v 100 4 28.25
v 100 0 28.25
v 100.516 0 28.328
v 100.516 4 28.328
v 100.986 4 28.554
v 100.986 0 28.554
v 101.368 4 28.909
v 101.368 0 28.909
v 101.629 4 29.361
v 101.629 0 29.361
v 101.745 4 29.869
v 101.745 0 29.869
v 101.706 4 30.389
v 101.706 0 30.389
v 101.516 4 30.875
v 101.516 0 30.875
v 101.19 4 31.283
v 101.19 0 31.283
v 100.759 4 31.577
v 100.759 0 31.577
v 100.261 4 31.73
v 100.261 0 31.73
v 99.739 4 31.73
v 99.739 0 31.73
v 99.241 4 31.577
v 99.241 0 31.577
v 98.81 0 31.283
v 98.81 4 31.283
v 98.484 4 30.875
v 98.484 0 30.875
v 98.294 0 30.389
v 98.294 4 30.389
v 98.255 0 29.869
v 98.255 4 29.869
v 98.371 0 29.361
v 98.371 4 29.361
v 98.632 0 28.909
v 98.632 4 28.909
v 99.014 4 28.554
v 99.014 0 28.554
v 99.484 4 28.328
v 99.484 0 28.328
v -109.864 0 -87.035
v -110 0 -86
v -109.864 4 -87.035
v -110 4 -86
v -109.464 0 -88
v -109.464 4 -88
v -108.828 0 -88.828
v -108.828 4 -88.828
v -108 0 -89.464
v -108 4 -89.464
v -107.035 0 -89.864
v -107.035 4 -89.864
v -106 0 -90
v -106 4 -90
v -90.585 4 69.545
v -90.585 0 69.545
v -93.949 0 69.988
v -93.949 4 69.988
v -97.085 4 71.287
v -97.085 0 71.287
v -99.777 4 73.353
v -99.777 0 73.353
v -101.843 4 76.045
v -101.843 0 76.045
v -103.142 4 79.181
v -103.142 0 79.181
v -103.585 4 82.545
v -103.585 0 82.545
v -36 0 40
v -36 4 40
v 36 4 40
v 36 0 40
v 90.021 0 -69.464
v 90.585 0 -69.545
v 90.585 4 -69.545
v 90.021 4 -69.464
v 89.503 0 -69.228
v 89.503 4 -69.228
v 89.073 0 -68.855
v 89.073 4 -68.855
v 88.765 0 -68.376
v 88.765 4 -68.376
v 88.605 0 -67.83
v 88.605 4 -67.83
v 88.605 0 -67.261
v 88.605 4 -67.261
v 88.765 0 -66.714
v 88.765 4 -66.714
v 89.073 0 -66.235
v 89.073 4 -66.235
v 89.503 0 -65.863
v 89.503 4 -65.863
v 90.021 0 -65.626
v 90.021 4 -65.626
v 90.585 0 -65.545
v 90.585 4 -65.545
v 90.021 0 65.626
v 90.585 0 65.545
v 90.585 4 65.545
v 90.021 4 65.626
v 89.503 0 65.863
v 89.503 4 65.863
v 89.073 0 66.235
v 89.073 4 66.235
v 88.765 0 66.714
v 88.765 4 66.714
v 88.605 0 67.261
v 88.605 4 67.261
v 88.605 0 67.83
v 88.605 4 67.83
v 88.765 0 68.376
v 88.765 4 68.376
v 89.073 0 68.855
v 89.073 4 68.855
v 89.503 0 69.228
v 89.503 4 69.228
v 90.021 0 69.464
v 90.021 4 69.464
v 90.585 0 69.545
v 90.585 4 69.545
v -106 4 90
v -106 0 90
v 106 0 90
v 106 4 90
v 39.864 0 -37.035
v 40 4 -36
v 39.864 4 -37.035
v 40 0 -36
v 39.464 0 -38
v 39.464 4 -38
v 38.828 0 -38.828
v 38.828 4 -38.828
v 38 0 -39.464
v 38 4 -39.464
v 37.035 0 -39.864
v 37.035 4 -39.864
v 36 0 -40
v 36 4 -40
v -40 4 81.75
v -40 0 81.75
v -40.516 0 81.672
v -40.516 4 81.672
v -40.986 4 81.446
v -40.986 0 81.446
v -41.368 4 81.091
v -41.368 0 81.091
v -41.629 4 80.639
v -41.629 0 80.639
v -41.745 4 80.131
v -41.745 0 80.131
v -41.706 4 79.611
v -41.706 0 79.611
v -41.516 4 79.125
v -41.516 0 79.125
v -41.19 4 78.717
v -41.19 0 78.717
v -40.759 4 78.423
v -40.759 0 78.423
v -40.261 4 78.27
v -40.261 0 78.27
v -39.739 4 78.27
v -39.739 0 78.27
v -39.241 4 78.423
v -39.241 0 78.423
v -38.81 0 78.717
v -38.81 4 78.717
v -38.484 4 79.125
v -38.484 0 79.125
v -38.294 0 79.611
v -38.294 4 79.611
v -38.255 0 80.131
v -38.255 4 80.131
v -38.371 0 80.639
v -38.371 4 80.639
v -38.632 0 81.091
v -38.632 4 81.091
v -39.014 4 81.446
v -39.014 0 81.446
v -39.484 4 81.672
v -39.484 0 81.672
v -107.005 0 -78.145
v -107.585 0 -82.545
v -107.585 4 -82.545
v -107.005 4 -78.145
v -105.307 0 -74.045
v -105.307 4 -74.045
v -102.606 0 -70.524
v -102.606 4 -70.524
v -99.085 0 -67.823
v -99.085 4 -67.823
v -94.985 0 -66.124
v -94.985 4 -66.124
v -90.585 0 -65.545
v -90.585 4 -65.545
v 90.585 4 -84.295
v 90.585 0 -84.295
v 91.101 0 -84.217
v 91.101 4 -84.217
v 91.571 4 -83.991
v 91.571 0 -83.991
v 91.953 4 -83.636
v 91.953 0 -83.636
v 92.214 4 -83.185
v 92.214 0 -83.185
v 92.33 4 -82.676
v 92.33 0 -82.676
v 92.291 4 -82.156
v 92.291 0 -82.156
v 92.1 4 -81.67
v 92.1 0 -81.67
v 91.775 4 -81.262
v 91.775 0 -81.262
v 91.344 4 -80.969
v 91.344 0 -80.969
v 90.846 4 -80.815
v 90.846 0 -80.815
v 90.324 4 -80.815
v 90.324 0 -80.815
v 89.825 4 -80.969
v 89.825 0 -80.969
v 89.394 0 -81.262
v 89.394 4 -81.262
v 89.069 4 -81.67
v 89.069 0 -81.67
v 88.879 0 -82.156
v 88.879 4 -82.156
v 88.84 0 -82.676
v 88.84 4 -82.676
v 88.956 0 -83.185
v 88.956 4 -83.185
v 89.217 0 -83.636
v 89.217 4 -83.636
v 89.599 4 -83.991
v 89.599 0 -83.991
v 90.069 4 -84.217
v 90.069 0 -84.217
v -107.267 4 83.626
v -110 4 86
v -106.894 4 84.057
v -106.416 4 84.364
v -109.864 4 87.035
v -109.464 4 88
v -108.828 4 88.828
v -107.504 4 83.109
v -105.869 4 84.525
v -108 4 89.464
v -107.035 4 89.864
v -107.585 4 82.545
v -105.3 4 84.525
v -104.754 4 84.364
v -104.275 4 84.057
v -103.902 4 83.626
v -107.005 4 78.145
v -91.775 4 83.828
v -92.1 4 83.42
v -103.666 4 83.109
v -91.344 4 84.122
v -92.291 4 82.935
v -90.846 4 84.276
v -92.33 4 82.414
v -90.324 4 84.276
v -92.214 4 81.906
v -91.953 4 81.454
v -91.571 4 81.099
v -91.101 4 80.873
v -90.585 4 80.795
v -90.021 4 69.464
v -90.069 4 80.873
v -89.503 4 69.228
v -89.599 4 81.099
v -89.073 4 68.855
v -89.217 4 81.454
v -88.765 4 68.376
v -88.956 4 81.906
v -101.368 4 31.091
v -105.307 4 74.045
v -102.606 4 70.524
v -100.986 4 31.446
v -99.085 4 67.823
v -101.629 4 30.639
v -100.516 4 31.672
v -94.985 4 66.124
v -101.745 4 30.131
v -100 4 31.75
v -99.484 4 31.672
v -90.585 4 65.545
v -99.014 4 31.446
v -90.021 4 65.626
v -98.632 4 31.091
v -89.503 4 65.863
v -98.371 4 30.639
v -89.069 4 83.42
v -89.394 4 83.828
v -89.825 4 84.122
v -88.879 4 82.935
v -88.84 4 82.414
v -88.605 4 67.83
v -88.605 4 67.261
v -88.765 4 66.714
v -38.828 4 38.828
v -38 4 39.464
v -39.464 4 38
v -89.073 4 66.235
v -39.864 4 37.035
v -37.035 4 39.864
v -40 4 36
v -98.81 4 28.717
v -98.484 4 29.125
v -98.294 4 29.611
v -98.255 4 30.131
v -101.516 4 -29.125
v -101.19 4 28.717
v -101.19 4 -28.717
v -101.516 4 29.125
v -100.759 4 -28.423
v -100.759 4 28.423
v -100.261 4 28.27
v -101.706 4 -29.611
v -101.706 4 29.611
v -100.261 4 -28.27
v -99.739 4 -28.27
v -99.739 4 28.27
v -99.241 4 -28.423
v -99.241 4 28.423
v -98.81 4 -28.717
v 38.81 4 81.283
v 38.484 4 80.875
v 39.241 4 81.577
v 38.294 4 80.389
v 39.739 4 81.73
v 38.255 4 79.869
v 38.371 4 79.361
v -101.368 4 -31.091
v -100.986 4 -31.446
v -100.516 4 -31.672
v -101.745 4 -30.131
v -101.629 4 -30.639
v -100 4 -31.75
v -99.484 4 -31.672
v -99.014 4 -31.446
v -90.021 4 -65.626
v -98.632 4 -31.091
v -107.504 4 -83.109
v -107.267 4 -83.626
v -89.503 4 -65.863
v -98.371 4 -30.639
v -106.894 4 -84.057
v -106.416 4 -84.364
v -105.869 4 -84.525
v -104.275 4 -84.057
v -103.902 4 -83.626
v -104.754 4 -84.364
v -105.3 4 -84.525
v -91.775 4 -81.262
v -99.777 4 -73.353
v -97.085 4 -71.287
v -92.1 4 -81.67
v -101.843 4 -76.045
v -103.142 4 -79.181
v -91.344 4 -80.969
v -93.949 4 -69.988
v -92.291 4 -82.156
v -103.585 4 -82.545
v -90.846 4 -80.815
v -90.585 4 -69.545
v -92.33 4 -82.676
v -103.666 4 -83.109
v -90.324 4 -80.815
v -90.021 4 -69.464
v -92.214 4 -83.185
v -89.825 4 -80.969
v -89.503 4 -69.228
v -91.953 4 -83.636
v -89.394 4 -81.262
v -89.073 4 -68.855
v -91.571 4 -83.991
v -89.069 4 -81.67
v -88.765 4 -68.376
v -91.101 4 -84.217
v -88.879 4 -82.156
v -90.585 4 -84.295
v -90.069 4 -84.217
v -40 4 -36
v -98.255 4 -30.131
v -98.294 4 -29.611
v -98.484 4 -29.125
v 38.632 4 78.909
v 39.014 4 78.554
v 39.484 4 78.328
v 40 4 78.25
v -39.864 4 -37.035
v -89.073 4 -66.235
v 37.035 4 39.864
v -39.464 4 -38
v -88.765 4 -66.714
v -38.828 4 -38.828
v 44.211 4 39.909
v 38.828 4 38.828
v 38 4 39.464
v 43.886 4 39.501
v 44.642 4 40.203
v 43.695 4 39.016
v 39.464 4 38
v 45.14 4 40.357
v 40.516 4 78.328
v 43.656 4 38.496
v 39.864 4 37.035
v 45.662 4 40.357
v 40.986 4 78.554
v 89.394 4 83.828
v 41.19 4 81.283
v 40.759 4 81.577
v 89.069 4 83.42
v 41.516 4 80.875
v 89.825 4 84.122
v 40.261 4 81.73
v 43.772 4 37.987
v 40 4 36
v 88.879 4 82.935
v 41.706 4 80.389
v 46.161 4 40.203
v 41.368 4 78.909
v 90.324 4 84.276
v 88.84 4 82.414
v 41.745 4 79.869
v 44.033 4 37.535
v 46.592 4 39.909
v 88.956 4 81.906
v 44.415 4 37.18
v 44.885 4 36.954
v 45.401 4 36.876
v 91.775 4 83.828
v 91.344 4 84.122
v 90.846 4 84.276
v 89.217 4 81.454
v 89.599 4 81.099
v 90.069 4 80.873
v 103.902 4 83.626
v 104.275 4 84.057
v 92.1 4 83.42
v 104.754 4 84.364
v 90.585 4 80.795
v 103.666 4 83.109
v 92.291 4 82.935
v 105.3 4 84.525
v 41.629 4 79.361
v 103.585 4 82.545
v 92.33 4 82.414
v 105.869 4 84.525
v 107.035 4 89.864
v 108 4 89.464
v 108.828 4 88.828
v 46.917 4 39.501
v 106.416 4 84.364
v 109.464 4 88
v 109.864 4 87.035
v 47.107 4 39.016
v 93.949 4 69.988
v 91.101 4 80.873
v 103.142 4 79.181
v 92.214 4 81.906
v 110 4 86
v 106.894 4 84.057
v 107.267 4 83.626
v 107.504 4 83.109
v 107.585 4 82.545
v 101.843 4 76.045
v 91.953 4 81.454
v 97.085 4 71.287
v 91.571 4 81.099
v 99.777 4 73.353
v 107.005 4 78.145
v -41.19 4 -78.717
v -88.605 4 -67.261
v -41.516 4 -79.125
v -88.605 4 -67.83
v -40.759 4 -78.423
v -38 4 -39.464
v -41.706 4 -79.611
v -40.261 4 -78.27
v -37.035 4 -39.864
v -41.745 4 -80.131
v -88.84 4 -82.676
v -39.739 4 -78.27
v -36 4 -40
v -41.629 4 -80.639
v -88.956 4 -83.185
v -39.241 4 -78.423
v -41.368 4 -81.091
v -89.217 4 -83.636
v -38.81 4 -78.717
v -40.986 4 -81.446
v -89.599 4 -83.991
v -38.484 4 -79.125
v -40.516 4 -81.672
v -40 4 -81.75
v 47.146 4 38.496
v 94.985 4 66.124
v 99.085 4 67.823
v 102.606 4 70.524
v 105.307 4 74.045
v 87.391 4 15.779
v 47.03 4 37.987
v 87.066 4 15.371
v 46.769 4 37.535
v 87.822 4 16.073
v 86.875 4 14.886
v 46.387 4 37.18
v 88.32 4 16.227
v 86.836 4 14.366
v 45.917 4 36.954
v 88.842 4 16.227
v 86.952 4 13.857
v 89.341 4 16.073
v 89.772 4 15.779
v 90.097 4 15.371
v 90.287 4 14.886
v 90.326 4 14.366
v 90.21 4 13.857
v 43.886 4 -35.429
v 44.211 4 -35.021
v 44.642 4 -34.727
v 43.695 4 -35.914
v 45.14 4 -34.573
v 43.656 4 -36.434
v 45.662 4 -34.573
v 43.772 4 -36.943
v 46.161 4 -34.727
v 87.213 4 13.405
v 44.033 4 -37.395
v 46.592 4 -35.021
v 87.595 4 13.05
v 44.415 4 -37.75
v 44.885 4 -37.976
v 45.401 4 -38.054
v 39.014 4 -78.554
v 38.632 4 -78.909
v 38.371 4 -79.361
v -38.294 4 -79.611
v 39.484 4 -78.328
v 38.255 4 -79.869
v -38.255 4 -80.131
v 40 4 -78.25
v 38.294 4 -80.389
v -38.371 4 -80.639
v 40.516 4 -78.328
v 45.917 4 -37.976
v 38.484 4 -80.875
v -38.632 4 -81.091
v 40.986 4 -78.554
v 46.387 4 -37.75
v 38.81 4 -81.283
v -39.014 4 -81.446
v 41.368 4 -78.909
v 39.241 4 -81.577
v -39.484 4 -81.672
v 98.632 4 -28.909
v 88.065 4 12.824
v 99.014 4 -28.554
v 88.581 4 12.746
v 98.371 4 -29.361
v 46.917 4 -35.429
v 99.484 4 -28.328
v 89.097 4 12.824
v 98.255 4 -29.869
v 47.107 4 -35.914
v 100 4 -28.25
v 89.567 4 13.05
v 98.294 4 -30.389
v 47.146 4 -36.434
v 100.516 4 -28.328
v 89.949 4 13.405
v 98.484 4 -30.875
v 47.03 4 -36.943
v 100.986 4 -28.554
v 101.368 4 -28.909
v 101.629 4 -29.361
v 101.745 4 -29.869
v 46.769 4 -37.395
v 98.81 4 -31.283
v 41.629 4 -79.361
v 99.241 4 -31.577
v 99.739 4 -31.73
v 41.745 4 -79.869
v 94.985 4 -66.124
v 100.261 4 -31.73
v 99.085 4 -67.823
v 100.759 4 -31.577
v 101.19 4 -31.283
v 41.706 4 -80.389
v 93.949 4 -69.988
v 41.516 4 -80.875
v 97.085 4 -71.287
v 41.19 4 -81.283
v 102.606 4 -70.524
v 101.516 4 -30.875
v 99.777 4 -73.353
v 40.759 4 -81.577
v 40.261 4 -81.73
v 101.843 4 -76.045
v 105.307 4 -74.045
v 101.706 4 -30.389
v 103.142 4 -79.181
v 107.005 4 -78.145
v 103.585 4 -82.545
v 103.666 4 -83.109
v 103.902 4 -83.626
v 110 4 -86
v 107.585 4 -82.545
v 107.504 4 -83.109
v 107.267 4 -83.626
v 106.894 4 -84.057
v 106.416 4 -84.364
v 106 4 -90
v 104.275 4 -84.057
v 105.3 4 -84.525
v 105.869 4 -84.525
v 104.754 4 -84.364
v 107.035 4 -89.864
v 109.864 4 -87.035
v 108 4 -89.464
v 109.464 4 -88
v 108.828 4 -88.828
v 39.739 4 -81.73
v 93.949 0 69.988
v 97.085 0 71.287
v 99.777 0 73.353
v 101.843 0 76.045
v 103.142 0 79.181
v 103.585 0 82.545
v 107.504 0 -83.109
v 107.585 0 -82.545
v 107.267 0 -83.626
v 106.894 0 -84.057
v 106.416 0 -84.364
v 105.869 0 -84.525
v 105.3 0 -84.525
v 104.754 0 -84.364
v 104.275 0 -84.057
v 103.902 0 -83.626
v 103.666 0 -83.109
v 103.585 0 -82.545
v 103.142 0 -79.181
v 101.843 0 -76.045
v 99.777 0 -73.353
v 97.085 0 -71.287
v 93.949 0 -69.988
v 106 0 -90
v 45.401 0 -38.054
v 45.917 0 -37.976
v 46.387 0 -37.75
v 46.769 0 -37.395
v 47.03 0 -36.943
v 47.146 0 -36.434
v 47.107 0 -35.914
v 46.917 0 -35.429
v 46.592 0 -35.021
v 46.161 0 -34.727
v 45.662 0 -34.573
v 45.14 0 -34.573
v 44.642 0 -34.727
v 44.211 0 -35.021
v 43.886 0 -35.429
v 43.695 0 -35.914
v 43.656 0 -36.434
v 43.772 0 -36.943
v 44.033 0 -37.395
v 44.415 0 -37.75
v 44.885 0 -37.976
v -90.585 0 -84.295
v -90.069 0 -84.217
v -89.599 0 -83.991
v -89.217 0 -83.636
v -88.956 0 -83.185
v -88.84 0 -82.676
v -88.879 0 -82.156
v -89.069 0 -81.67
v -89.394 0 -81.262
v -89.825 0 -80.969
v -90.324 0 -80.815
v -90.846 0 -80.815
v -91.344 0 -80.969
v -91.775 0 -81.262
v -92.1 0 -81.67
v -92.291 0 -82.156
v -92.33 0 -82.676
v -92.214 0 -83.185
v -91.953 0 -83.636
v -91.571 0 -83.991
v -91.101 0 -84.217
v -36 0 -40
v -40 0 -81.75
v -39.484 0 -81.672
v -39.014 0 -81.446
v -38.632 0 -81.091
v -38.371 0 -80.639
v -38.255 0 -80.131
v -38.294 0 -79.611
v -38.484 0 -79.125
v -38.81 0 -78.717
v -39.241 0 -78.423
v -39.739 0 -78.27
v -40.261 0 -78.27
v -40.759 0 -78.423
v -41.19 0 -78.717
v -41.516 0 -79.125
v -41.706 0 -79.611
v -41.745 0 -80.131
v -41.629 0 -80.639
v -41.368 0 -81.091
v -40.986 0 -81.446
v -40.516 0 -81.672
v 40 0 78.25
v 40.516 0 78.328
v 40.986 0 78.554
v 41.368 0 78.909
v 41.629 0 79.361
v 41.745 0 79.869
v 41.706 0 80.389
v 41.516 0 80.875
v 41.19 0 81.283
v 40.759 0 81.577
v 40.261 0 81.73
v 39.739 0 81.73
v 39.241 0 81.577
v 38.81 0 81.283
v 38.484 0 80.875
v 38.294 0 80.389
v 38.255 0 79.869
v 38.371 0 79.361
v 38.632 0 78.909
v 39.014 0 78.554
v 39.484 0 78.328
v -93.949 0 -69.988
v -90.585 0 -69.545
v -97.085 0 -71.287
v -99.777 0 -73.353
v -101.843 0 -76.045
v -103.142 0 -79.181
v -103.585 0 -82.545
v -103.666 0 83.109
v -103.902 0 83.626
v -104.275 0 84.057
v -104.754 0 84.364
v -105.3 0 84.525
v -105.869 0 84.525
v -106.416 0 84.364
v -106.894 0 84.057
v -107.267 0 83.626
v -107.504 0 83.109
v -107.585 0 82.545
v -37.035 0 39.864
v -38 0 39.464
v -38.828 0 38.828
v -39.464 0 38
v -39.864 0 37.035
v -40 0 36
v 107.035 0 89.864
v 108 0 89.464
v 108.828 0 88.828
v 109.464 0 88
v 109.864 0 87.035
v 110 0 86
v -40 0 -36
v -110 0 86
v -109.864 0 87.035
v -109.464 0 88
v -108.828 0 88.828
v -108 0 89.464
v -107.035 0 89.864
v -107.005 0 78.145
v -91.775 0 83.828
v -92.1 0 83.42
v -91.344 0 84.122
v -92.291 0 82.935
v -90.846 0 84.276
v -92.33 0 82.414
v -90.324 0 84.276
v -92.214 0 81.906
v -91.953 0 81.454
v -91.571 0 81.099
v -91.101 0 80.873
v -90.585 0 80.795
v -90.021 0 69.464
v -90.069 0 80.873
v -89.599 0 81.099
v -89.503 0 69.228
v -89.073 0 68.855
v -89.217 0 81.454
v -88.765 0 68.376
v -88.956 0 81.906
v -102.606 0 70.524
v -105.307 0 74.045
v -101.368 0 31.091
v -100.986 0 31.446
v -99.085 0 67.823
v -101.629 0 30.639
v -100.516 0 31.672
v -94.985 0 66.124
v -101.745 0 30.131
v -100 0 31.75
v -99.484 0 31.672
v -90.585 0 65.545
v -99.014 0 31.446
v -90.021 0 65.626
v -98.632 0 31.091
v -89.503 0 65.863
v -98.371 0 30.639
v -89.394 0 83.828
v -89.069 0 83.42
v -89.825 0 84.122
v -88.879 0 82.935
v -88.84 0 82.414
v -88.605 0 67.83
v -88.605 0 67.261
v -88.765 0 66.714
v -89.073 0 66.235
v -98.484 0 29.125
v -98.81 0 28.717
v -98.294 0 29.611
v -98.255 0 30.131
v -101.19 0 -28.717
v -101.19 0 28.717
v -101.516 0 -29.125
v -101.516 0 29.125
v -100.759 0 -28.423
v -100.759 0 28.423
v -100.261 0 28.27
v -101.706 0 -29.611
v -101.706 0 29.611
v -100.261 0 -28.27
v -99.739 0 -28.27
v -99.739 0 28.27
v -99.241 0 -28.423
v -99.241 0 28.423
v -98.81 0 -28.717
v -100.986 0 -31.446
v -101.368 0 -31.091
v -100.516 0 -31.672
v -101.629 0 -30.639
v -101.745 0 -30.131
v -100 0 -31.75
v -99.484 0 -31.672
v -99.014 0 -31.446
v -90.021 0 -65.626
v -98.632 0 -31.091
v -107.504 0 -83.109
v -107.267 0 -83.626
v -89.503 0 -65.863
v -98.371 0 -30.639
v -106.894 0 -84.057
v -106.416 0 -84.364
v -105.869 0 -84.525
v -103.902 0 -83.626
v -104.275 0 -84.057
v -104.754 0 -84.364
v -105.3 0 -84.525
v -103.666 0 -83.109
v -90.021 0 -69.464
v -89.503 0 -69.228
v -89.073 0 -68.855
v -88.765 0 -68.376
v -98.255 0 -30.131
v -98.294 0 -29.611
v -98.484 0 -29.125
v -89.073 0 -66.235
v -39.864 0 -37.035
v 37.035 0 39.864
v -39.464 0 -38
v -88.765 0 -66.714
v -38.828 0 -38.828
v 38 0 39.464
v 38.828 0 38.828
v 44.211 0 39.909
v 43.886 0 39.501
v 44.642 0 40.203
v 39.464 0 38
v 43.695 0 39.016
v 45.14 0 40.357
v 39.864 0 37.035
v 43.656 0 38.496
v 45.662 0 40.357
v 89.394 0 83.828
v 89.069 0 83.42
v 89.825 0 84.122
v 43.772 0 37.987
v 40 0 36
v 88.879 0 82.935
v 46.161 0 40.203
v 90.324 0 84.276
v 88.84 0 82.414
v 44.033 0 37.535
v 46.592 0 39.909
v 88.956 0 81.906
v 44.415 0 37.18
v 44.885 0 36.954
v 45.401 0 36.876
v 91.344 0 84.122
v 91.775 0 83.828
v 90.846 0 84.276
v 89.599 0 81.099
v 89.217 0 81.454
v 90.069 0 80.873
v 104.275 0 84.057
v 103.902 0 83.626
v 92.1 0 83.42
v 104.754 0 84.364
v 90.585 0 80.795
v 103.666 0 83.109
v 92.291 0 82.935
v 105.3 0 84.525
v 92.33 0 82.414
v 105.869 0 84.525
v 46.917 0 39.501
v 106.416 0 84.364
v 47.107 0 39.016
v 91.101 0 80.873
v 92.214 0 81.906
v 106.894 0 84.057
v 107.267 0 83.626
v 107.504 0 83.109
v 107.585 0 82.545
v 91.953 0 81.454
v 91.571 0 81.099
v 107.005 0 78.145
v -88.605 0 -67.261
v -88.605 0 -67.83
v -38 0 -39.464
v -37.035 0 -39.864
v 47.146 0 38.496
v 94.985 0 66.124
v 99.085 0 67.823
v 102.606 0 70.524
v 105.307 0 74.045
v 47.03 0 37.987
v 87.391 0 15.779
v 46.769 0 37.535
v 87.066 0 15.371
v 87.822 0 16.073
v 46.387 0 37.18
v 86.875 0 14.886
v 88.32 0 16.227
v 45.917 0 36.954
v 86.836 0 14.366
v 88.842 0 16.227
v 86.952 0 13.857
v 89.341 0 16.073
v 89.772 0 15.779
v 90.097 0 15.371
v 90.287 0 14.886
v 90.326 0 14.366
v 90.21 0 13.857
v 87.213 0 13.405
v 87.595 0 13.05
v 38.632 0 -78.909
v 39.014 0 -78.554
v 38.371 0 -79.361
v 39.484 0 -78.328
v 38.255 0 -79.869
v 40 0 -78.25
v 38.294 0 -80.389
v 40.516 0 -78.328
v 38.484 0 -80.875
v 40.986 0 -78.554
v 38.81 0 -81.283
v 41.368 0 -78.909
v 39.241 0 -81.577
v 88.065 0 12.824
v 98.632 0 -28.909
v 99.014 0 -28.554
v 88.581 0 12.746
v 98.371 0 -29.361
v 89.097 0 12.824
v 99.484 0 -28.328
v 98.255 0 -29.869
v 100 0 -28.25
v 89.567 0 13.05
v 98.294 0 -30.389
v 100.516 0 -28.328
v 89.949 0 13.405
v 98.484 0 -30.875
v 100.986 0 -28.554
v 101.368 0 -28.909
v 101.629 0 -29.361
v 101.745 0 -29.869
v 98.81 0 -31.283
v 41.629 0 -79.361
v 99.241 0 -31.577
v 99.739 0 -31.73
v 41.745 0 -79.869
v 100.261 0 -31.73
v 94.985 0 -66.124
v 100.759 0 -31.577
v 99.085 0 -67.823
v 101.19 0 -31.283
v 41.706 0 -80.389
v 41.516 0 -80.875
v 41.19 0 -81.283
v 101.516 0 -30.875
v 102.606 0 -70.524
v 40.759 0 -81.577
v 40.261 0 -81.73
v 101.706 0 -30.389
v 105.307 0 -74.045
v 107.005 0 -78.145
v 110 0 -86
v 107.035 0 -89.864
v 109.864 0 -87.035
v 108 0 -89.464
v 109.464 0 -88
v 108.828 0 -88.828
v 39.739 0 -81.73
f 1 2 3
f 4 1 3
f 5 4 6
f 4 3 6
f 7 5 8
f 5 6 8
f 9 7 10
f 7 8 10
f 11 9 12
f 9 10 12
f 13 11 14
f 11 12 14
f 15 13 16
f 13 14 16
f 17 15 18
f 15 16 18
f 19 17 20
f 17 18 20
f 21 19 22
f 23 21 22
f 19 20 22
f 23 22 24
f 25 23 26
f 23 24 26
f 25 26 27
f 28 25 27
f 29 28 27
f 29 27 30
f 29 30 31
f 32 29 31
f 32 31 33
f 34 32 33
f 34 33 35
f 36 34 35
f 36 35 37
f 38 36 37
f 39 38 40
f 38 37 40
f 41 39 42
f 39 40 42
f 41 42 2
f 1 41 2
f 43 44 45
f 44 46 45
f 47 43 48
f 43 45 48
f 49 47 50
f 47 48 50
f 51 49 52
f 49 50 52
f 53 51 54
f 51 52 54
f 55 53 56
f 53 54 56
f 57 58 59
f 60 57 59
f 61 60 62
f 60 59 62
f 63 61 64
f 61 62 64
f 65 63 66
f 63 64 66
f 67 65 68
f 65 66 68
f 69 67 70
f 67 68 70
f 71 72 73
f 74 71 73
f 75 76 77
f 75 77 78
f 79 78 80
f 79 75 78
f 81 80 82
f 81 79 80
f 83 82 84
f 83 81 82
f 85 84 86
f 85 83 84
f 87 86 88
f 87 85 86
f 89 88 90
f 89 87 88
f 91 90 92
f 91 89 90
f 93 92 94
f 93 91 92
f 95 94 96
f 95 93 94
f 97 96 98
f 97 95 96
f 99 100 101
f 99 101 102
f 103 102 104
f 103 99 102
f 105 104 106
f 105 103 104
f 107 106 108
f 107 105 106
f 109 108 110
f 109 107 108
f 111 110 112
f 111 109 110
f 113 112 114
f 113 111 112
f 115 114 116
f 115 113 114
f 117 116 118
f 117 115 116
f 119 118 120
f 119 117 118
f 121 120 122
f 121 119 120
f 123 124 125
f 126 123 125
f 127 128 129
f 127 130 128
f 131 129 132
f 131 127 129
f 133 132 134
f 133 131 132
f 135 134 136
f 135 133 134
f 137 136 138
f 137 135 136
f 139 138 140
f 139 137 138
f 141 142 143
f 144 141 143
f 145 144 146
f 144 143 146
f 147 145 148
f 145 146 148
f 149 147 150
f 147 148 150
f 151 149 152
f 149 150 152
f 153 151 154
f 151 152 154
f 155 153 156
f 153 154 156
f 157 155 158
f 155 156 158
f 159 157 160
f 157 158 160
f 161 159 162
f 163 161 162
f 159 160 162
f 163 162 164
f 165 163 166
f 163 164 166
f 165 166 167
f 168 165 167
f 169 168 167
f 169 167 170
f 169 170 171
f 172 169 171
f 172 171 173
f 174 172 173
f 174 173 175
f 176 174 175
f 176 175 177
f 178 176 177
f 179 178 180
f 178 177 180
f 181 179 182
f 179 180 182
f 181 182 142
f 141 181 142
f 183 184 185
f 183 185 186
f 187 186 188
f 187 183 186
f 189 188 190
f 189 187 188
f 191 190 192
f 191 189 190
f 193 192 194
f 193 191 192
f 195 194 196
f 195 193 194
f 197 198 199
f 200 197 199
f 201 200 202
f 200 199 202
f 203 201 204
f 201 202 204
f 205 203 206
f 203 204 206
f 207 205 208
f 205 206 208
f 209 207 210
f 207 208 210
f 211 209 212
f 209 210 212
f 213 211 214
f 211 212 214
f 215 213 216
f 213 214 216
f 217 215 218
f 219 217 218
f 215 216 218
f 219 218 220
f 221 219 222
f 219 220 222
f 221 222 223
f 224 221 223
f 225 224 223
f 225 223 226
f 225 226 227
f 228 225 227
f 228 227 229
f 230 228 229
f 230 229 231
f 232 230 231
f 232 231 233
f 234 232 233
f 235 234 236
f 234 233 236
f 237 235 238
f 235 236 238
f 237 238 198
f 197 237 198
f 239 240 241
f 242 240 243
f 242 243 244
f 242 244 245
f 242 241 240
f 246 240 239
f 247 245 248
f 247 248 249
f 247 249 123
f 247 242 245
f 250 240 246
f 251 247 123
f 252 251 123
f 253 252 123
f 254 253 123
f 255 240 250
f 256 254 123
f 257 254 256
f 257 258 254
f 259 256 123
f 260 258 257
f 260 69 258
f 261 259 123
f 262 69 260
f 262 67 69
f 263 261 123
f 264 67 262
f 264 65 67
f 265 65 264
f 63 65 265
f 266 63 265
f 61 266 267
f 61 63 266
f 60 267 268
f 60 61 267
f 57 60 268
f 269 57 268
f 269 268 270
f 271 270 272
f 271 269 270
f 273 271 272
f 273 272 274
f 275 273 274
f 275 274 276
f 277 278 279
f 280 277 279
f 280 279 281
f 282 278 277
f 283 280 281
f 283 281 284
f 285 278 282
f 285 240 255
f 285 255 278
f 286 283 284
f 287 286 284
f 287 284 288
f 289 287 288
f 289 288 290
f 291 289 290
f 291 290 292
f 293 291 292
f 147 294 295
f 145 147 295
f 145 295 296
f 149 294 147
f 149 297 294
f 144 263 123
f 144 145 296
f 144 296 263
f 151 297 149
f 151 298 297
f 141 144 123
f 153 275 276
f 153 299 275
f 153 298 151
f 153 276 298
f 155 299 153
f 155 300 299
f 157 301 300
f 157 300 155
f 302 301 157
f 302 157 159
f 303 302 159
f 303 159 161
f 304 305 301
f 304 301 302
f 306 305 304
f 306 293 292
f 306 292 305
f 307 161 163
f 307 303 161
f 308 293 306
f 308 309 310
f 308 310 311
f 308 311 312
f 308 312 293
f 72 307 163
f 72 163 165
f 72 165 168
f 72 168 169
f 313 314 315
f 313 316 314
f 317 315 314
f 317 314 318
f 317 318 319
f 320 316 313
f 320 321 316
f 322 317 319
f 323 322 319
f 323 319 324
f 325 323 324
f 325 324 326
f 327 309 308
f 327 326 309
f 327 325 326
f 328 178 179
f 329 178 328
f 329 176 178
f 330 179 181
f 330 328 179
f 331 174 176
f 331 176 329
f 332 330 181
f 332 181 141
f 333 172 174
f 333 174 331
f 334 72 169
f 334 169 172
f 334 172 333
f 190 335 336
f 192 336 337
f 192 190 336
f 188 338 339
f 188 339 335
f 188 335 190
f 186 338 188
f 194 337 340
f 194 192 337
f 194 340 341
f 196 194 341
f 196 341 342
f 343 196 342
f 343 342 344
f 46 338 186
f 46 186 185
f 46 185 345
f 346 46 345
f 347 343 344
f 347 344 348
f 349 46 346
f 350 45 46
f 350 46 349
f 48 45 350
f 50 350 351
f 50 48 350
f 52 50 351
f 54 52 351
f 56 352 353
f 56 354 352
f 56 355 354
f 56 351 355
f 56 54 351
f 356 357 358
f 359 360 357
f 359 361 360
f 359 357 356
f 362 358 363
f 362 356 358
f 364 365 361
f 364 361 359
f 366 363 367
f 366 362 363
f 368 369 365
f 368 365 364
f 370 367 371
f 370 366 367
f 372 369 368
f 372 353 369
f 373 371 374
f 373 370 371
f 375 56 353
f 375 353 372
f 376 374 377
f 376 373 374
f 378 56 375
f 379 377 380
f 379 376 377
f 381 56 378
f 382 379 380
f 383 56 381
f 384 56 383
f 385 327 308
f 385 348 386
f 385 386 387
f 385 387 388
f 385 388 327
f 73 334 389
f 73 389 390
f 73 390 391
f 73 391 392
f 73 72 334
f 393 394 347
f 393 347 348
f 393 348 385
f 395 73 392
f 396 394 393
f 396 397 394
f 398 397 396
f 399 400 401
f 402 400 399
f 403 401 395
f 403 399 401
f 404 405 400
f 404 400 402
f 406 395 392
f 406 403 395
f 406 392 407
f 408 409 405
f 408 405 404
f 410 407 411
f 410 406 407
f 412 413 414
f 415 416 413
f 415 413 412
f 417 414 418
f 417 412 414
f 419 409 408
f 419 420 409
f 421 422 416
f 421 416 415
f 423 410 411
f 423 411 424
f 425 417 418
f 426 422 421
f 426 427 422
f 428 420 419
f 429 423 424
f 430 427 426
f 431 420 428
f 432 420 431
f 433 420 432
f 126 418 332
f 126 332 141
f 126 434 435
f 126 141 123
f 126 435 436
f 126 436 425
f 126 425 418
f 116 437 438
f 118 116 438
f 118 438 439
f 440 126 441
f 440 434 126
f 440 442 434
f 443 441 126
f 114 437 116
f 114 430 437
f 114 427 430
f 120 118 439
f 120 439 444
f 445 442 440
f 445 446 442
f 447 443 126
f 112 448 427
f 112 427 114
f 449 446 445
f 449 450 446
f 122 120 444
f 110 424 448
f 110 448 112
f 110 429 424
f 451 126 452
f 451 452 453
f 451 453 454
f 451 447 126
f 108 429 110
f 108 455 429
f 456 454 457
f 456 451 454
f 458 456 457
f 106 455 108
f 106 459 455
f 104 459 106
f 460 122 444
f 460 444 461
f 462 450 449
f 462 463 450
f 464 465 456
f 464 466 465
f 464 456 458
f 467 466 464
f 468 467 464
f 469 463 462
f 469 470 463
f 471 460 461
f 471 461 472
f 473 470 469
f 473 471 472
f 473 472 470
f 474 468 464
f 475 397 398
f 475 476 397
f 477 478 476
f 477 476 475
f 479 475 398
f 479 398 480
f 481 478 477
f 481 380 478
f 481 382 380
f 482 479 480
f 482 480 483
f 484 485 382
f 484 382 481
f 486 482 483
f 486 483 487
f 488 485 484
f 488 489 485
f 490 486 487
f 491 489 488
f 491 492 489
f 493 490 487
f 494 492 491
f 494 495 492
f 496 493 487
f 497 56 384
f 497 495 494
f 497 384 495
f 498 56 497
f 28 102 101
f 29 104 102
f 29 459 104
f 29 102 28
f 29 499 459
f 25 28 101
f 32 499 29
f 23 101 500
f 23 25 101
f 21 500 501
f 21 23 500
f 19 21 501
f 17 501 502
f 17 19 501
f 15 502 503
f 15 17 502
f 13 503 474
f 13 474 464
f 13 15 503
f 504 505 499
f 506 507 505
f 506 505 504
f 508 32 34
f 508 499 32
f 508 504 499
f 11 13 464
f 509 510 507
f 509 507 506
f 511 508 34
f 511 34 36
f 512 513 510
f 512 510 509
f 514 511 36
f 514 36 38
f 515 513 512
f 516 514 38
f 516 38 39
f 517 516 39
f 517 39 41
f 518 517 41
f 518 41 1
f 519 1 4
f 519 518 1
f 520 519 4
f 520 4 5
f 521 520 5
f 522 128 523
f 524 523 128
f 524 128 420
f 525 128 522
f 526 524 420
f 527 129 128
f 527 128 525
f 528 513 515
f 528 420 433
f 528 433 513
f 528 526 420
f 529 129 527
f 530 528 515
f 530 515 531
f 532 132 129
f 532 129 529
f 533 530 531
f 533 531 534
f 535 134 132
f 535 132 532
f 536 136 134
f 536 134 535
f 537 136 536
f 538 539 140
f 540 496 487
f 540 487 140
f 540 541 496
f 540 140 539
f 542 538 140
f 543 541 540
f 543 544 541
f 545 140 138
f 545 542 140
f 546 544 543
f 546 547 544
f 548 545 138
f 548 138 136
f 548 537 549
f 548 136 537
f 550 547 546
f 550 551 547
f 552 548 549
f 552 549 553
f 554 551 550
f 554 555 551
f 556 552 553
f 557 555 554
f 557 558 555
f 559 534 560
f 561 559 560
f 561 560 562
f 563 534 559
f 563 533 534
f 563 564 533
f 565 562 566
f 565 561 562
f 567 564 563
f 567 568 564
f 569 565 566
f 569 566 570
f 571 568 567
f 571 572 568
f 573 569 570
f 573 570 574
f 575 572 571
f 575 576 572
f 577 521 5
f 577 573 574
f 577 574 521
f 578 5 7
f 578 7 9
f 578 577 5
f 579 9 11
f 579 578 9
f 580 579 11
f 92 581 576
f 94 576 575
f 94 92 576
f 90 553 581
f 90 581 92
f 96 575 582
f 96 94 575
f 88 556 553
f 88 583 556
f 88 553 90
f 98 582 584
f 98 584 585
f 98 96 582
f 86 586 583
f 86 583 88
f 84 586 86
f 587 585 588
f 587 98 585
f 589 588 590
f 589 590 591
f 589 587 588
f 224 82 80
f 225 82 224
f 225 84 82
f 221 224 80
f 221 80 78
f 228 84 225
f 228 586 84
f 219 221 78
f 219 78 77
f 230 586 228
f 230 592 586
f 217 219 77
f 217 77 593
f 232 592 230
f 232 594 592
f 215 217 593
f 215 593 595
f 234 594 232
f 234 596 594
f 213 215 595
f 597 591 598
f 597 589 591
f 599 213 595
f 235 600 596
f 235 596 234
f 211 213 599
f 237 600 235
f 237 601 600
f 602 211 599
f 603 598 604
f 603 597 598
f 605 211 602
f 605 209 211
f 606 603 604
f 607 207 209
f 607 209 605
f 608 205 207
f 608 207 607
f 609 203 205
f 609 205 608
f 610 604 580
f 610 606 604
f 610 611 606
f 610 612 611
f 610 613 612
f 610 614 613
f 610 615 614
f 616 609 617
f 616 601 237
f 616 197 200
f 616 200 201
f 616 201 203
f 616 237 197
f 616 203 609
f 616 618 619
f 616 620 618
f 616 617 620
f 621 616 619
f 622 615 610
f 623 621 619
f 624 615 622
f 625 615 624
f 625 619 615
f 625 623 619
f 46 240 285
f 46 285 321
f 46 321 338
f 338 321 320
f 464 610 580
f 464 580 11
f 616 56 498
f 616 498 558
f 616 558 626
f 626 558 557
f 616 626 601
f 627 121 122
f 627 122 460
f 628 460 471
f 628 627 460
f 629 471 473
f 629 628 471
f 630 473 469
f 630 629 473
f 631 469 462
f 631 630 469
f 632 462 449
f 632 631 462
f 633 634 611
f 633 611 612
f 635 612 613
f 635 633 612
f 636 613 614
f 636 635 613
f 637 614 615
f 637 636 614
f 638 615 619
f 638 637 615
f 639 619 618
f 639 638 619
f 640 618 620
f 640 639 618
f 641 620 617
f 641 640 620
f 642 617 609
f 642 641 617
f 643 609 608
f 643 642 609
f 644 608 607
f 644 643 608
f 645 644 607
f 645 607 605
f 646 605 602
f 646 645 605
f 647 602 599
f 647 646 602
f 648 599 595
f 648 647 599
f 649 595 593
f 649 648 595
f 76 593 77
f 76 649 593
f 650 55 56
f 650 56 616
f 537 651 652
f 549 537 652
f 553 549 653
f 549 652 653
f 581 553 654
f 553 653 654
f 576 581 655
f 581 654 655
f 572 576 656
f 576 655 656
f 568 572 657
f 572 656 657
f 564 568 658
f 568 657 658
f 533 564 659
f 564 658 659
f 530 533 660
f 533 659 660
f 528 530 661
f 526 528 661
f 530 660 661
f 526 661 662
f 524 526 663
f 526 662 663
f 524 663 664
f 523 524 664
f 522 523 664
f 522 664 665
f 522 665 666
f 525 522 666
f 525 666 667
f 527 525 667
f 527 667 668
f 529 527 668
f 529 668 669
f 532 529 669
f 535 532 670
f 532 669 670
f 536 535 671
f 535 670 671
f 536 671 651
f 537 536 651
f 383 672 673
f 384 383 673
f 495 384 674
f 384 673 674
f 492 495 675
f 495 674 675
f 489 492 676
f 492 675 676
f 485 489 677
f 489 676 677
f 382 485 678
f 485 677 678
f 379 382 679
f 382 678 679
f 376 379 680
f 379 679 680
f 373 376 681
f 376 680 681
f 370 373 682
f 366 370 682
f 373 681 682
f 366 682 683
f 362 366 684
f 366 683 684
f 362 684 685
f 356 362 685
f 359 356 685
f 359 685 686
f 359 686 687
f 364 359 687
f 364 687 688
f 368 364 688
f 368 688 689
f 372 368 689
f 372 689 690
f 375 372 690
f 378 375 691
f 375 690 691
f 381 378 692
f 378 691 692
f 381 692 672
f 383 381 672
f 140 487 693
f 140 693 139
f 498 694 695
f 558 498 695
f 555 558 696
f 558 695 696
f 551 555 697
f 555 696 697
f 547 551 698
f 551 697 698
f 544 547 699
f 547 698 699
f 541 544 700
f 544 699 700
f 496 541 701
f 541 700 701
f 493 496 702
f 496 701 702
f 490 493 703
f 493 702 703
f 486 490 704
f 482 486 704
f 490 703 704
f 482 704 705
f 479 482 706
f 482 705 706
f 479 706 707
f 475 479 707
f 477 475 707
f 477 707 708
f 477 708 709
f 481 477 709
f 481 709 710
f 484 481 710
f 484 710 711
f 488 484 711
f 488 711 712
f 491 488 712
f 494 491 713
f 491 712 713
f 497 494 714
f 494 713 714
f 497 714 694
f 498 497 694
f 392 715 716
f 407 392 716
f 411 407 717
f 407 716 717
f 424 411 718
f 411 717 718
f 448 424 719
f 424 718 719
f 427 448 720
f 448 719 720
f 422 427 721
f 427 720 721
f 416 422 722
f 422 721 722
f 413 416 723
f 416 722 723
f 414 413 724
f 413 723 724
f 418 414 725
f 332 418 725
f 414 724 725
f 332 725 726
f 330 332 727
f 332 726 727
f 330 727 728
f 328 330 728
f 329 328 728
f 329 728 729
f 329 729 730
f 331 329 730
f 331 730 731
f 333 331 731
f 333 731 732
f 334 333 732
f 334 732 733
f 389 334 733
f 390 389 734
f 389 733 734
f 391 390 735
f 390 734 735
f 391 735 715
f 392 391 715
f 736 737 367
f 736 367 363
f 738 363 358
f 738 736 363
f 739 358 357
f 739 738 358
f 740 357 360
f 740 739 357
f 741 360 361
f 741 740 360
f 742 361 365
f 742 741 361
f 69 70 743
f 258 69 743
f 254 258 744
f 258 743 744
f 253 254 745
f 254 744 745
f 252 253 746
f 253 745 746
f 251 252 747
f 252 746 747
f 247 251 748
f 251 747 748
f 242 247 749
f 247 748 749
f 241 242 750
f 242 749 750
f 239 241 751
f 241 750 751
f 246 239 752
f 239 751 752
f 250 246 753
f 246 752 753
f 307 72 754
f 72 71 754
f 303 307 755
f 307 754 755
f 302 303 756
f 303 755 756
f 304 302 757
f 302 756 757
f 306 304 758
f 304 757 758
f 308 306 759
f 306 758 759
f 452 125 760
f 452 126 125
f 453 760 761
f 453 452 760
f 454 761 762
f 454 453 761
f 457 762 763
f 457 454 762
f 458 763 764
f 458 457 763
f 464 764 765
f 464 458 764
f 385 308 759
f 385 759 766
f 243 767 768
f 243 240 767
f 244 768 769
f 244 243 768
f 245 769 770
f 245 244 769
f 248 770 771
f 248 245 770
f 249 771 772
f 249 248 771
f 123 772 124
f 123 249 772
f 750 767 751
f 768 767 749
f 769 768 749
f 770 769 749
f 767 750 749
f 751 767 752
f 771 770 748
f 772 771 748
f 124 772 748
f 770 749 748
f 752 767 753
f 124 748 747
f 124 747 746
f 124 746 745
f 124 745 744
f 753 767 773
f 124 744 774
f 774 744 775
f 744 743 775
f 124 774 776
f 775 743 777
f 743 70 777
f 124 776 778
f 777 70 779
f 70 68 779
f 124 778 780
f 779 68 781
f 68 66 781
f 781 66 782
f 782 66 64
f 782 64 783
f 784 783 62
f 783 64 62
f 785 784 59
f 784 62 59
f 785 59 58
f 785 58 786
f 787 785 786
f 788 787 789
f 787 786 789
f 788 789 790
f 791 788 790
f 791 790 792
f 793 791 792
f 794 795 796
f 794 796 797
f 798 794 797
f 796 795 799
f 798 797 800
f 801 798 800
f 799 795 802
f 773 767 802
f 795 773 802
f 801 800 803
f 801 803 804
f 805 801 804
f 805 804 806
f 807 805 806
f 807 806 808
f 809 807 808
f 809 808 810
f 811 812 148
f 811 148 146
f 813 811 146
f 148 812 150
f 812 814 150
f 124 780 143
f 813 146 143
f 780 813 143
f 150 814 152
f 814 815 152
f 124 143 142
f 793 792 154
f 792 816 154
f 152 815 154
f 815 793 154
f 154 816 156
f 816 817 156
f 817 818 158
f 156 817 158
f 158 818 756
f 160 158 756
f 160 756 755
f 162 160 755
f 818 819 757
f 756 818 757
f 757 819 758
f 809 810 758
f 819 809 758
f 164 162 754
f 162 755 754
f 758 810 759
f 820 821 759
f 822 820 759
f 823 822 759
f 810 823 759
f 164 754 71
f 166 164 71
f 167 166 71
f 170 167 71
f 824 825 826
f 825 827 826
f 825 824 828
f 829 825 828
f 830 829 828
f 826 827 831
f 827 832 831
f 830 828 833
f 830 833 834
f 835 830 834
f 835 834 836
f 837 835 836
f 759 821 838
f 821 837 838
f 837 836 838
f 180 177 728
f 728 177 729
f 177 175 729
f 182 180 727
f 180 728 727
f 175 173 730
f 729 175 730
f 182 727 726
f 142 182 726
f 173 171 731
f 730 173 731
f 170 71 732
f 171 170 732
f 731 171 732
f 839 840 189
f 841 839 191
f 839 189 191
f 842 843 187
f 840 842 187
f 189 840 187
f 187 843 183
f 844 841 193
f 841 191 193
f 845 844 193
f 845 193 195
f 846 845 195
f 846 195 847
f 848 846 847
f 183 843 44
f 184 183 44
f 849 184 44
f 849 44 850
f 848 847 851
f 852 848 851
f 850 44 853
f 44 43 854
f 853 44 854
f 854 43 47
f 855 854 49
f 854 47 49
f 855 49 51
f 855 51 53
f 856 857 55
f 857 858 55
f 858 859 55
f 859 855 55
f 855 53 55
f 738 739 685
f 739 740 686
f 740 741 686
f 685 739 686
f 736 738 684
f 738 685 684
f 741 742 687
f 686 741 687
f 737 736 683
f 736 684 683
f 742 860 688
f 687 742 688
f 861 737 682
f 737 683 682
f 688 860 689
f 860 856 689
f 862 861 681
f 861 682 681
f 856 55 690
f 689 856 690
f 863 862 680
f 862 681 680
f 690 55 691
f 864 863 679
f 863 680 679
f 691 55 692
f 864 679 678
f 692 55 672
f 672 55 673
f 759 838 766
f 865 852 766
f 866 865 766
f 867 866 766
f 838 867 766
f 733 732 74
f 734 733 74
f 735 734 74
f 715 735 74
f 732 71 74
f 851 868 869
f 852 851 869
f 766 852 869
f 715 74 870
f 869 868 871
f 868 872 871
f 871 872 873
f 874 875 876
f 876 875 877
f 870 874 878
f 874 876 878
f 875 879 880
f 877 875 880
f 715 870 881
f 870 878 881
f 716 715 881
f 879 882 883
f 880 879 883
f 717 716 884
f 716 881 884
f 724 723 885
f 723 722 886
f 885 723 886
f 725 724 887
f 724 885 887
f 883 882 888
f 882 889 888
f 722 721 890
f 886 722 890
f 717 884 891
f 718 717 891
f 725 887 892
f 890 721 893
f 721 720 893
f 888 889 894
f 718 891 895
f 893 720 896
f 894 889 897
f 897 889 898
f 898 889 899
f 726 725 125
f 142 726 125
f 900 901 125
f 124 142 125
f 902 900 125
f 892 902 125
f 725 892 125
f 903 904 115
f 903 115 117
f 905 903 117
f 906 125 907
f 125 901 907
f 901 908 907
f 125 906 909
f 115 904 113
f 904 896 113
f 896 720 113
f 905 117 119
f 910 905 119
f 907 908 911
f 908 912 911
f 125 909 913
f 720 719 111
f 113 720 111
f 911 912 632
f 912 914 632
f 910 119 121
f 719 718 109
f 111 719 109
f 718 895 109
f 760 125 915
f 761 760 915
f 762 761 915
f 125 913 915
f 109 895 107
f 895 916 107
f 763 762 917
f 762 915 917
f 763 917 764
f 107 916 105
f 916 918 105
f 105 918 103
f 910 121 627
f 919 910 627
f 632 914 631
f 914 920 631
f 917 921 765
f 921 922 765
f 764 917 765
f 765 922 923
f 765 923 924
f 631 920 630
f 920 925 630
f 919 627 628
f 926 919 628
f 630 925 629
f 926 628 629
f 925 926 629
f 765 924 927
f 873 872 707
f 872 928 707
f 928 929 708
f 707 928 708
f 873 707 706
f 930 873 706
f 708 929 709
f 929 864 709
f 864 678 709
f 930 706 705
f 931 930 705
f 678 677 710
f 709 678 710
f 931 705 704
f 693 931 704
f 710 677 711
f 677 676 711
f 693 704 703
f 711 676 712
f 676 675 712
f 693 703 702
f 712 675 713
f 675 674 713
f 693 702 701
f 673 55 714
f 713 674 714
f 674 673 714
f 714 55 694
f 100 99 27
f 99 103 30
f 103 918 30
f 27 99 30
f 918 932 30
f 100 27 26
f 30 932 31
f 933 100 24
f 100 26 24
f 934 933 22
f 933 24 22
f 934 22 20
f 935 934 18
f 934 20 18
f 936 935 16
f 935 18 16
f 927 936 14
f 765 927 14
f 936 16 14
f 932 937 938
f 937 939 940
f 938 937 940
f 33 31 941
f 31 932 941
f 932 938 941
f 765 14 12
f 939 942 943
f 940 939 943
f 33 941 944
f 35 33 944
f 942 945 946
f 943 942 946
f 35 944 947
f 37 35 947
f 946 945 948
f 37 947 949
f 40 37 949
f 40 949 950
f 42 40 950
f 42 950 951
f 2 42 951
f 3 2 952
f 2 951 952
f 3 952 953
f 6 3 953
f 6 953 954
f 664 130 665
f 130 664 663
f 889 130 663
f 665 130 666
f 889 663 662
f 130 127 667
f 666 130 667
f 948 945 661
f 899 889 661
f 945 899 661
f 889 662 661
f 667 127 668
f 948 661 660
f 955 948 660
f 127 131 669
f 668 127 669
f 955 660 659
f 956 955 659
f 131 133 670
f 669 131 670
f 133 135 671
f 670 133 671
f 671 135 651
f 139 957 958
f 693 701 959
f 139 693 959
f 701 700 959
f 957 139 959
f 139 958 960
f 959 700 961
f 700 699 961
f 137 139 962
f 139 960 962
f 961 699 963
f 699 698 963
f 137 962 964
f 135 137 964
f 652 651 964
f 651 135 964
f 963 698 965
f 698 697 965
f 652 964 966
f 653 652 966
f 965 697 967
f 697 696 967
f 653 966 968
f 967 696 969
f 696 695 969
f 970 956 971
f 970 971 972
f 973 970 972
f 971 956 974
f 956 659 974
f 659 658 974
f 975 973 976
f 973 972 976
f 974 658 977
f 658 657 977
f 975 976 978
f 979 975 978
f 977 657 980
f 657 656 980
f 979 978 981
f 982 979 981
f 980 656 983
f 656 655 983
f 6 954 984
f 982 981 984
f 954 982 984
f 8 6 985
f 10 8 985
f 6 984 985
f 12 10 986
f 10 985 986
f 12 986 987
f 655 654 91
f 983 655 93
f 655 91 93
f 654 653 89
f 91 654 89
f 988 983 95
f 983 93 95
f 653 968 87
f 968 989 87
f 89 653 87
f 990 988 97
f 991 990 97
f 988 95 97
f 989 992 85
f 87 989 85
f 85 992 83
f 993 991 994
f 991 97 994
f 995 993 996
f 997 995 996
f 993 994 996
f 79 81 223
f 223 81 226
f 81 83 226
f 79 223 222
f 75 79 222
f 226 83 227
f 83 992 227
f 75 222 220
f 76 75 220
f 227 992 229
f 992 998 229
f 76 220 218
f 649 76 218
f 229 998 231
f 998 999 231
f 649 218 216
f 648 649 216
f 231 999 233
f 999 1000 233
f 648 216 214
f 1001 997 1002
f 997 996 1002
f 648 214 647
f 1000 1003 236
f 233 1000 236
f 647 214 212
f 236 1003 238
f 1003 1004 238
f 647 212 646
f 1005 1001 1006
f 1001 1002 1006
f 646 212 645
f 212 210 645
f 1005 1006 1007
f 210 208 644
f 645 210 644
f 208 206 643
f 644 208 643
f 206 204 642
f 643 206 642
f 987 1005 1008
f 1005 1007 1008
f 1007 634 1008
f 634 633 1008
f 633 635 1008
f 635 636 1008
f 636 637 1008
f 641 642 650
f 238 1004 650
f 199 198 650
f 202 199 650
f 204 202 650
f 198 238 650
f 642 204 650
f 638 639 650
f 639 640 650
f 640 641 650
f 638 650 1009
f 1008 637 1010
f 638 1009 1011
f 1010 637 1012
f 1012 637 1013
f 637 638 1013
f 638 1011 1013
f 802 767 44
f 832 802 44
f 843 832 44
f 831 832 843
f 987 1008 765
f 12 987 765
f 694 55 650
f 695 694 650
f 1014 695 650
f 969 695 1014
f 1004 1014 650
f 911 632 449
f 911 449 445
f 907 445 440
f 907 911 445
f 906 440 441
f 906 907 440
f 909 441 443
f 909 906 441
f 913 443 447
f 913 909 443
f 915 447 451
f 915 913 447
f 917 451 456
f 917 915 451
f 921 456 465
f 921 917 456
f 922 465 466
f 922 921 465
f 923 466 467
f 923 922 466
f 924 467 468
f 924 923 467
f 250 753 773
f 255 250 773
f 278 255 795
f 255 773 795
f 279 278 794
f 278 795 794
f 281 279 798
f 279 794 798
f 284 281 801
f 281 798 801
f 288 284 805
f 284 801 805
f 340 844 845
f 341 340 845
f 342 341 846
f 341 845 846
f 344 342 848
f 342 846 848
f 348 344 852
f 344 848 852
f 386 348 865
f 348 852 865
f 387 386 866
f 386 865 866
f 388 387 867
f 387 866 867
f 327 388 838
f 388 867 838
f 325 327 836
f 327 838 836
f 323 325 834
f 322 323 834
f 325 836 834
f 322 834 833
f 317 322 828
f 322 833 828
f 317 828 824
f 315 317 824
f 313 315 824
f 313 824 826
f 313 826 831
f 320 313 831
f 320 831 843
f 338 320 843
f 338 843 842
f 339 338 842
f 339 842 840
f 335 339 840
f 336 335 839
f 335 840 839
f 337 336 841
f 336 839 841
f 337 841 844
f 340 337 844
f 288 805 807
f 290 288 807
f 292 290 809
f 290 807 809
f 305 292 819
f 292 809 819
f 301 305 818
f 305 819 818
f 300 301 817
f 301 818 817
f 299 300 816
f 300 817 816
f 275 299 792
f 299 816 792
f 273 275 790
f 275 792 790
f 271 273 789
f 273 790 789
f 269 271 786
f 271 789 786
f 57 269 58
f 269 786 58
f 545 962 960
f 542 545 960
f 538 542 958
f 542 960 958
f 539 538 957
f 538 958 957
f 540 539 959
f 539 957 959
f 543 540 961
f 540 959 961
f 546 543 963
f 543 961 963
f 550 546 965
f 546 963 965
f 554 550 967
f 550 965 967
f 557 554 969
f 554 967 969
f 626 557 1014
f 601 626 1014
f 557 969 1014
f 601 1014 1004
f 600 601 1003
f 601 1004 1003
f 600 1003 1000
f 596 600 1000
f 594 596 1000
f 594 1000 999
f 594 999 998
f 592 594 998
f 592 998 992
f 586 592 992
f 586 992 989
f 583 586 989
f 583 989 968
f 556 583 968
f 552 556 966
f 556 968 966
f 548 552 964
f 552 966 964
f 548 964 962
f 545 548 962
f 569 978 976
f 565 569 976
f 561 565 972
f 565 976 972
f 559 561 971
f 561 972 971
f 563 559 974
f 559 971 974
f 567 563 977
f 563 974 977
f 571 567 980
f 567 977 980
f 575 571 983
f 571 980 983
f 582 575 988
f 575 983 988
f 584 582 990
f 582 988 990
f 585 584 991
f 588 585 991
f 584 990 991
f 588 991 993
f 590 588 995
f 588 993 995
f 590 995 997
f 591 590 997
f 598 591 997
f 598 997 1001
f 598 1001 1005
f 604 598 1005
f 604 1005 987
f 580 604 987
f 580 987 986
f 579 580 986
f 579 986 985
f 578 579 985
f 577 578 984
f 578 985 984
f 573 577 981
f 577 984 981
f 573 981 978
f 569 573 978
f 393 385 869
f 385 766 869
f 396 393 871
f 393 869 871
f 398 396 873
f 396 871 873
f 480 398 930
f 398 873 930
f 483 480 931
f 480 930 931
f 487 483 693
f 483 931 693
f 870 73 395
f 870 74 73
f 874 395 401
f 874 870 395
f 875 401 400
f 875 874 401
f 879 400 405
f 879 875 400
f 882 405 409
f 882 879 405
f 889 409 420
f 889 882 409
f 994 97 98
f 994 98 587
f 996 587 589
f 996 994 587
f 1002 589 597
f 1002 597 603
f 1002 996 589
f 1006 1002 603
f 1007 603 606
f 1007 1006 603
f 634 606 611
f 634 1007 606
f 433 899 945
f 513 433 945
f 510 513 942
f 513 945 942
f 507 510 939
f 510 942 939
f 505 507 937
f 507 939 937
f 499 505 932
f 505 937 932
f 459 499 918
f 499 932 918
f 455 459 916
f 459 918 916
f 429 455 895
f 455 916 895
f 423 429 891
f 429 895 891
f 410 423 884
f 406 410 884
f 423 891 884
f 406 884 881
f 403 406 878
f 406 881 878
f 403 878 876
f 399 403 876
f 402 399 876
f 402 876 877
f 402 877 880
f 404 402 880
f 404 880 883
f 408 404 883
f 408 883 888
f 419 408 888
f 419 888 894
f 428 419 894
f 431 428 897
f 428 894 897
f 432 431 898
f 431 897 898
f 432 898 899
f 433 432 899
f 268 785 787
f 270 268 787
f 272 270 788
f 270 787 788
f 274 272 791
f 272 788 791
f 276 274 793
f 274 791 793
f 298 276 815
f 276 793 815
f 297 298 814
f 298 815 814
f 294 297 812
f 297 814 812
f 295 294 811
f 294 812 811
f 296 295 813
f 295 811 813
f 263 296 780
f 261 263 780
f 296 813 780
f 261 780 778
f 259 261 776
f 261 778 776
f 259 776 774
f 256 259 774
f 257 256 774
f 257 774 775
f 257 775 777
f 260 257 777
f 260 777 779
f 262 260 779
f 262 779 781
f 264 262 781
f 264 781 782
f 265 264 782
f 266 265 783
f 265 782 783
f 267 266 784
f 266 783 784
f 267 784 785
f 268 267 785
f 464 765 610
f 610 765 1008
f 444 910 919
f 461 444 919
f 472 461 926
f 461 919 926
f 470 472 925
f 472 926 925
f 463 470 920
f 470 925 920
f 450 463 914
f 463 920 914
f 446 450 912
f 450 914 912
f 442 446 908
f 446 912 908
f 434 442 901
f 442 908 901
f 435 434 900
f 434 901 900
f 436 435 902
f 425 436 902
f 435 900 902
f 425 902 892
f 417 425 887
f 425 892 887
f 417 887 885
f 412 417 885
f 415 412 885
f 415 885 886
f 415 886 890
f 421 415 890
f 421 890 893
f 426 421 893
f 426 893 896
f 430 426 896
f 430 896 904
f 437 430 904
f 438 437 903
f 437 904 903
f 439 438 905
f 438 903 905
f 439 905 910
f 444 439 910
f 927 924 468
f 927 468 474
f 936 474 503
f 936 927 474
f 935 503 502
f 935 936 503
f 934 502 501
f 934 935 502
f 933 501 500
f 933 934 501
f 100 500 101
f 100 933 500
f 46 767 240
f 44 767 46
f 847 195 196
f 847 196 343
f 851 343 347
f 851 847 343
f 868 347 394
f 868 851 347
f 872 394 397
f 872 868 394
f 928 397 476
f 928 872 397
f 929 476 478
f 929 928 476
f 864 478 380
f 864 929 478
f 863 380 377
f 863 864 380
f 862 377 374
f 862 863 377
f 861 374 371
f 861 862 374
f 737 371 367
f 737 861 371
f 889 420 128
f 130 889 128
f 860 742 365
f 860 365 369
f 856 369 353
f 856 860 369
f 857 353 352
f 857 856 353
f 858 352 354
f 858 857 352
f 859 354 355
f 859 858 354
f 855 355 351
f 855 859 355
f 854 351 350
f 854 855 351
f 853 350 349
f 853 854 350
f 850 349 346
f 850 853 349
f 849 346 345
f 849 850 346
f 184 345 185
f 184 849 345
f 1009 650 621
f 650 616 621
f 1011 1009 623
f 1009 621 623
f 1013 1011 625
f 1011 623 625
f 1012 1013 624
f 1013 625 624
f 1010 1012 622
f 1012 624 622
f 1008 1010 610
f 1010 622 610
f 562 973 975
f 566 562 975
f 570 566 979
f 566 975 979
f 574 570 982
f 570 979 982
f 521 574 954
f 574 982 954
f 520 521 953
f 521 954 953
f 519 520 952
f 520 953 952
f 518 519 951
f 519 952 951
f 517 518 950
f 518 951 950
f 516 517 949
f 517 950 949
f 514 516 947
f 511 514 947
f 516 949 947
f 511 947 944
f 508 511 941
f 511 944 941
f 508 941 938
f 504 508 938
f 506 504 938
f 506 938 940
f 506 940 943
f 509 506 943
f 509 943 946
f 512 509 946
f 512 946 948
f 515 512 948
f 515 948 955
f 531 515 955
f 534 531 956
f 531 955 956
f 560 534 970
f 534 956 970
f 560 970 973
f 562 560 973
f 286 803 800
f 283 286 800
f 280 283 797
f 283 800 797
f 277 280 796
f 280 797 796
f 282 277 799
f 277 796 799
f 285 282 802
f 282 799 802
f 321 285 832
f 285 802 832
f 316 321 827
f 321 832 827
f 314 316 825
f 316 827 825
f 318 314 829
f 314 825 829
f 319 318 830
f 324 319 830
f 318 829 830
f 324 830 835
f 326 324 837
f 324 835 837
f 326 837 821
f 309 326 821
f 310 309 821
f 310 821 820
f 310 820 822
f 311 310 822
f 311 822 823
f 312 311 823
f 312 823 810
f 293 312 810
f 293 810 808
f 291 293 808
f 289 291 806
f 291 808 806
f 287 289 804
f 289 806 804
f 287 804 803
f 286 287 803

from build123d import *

# Parameters (mm, degrees)
SKETCH_1_W          = 220
SKETCH_1_H          = 180
EXTRUDE_1_DEPTH     = 4
SKETCH_2_W          = 80
SKETCH_2_H          = 80
CUT_EXTRUDE_1_DEPTH = 4
SKETCH_3_R          = 1.75
CUT_EXTRUDE_2_DEPTH = 4
SKETCH_5_R          = 1.75
CUT_EXTRUDE_3_DEPTH = 4
SKETCH_6_R          = 1.75
CUT_EXTRUDE_4_DEPTH = 4
FILLET_1_R          = 4
FILLET_2_R          = 4


with BuildPart() as part:
    # 草图1 → 凸台-拉伸1 (new body)
    with BuildSketch(Plane(origin=(0, 0, 0), x_dir=(1, 0, 0), z_dir=(0, 1, 0))):
        Rectangle(SKETCH_1_W, SKETCH_1_H)
    extrude(amount=EXTRUDE_1_DEPTH)

    # 草图2 → 切除-拉伸1 (cut)
    with BuildSketch(Plane(origin=(0, 4, 0), x_dir=(1, 0, 0), z_dir=(0, 1, 0))):
        Rectangle(SKETCH_2_W, SKETCH_2_H)
    extrude(amount=-CUT_EXTRUDE_1_DEPTH, mode=Mode.SUBTRACT)

    # 草图3 → 切除-拉伸2 (cut)
    with BuildSketch(Plane(origin=(0, 0, 0), x_dir=(-1, 0, 0), z_dir=(0, -1, 0))):
        with BuildLine():
            ThreePointArc((90.584745347, 69.545196968), (99.777133502, 73.352808813), (103.584745347, 82.545196968))
            ThreePointArc((103.584745347, 82.545196968), (105.584745347, 84.545196968), (107.584745347, 82.545196968))
            ThreePointArc((107.584745347, 82.545196968), (102.605560627, 70.524381688), (90.584745347, 65.545196968))
            ThreePointArc((90.584745347, 65.545196968), (88.584745347, 67.545196968), (90.584745347, 69.545196968))
        make_face()
        with Locations(Location((90.584745347, 82.545196968, 0), (0, 0, 90))):
            Circle(SKETCH_3_R)
        with BuildLine():
            ThreePointArc((-90.584745347, -69.545196968), (-99.777133502, -73.352808813), (-103.584745347, -82.545196968))
            ThreePointArc((-103.584745347, -82.545196968), (-105.584745347, -84.545196968), (-107.584745347, -82.545196968))
            ThreePointArc((-107.584745347, -82.545196968), (-102.605560627, -70.524381688), (-90.584745347, -65.545196968))
            ThreePointArc((-90.584745347, -65.545196968), (-88.584745347, -67.545196968), (-90.584745347, -69.545196968))
        make_face()
        with Locations(Location((-90.584745347, -82.545196968, 0), (0, 0, 90))):
            Circle(SKETCH_3_R)
        with BuildLine():
            ThreePointArc((-90.584745347, 65.545196968), (-102.605560627, 70.524381688), (-107.584745347, 82.545196968))
            ThreePointArc((-107.584745347, 82.545196968), (-105.584745347, 84.545196968), (-103.584745347, 82.545196968))
            ThreePointArc((-103.584745347, 82.545196968), (-99.777133502, 73.352808813), (-90.584745347, 69.545196968))
            ThreePointArc((-90.584745347, 69.545196968), (-88.584745347, 67.545196968), (-90.584745347, 65.545196968))
        make_face()
        with Locations(Location((-90.584745347, 82.545196968, 0), (0, 0, 90))):
            Circle(SKETCH_3_R)
        with BuildLine():
            ThreePointArc((90.584745347, -69.545196968), (99.777133502, -73.352808813), (103.584745347, -82.545196968))
            ThreePointArc((103.584745347, -82.545196968), (105.584745347, -84.545196968), (107.584745347, -82.545196968))
            ThreePointArc((107.584745347, -82.545196968), (102.605560627, -70.524381688), (90.584745347, -65.545196968))
            ThreePointArc((90.584745347, -65.545196968), (88.584745347, -67.545196968), (90.584745347, -69.545196968))
        make_face()
        with Locations(Location((90.584745347, -82.545196968, 0), (0, 0, 90))):
            Circle(SKETCH_3_R)
    extrude(amount=-CUT_EXTRUDE_2_DEPTH, mode=Mode.SUBTRACT)

    # 草图5 → 切除-拉伸3 (cut)
    with BuildSketch(Plane.XZ):
        with Locations(Location((45.401224127, 38.626328315, 0), (0, 0, 270))):
            Circle(SKETCH_5_R)
        with Locations(Location((88.581224127, 14.496328315, 0), (0, 0, 270))):
            Circle(SKETCH_5_R)
        with Locations(Location((45.401224127, -36.303671685, 0), (0, 0, 270))):
            Circle(SKETCH_5_R)
    extrude(amount=-CUT_EXTRUDE_3_DEPTH, mode=Mode.SUBTRACT)

    # 草图6 → 切除-拉伸4 (cut)
    with BuildSketch(Plane.XZ):
        with Locations(Location((-40, -80, 0), (0, 0, 270))):
            Circle(SKETCH_6_R)
        with Locations(Location((-100, -30, 0), (0, 0, 270))):
            Circle(SKETCH_6_R)
        with Locations(Location((40, -80, 0), (0, 0, 90))):
            Circle(SKETCH_6_R)
        with Locations(Location((100, -30, 0), (0, 0, 90))):
            Circle(SKETCH_6_R)
        with Locations(Location((100, 30, 0), (0, 0, 270))):
            Circle(SKETCH_6_R)
        with Locations(Location((40, 80, 0), (0, 0, 270))):
            Circle(SKETCH_6_R)
        with Locations(Location((-40, 80, 0), (0, 0, 90))):
            Circle(SKETCH_6_R)
        with Locations(Location((-100, 30, 0), (0, 0, 90))):
            Circle(SKETCH_6_R)
    extrude(amount=-CUT_EXTRUDE_4_DEPTH, mode=Mode.SUBTRACT)

    # 圆角1
    fillet_1_edges = [part.edges().sort_by_distance(p)[0] for p in [
        (110, 2, 90),
        (-110, 2, 90),
        (-110, 2, -90),
        (110, 2, -90),
    ]]
    fillet(fillet_1_edges, radius=FILLET_1_R)

    # 圆角2
    fillet_2_edges = [part.edges().sort_by_distance(p)[0] for p in [
        (-40, 2, -40),
        (40, 2, -40),
        (40, 2, 40),
        (-40, 2, 40),
    ]]
    fillet(fillet_2_edges, radius=FILLET_2_R)


solid = part.part
